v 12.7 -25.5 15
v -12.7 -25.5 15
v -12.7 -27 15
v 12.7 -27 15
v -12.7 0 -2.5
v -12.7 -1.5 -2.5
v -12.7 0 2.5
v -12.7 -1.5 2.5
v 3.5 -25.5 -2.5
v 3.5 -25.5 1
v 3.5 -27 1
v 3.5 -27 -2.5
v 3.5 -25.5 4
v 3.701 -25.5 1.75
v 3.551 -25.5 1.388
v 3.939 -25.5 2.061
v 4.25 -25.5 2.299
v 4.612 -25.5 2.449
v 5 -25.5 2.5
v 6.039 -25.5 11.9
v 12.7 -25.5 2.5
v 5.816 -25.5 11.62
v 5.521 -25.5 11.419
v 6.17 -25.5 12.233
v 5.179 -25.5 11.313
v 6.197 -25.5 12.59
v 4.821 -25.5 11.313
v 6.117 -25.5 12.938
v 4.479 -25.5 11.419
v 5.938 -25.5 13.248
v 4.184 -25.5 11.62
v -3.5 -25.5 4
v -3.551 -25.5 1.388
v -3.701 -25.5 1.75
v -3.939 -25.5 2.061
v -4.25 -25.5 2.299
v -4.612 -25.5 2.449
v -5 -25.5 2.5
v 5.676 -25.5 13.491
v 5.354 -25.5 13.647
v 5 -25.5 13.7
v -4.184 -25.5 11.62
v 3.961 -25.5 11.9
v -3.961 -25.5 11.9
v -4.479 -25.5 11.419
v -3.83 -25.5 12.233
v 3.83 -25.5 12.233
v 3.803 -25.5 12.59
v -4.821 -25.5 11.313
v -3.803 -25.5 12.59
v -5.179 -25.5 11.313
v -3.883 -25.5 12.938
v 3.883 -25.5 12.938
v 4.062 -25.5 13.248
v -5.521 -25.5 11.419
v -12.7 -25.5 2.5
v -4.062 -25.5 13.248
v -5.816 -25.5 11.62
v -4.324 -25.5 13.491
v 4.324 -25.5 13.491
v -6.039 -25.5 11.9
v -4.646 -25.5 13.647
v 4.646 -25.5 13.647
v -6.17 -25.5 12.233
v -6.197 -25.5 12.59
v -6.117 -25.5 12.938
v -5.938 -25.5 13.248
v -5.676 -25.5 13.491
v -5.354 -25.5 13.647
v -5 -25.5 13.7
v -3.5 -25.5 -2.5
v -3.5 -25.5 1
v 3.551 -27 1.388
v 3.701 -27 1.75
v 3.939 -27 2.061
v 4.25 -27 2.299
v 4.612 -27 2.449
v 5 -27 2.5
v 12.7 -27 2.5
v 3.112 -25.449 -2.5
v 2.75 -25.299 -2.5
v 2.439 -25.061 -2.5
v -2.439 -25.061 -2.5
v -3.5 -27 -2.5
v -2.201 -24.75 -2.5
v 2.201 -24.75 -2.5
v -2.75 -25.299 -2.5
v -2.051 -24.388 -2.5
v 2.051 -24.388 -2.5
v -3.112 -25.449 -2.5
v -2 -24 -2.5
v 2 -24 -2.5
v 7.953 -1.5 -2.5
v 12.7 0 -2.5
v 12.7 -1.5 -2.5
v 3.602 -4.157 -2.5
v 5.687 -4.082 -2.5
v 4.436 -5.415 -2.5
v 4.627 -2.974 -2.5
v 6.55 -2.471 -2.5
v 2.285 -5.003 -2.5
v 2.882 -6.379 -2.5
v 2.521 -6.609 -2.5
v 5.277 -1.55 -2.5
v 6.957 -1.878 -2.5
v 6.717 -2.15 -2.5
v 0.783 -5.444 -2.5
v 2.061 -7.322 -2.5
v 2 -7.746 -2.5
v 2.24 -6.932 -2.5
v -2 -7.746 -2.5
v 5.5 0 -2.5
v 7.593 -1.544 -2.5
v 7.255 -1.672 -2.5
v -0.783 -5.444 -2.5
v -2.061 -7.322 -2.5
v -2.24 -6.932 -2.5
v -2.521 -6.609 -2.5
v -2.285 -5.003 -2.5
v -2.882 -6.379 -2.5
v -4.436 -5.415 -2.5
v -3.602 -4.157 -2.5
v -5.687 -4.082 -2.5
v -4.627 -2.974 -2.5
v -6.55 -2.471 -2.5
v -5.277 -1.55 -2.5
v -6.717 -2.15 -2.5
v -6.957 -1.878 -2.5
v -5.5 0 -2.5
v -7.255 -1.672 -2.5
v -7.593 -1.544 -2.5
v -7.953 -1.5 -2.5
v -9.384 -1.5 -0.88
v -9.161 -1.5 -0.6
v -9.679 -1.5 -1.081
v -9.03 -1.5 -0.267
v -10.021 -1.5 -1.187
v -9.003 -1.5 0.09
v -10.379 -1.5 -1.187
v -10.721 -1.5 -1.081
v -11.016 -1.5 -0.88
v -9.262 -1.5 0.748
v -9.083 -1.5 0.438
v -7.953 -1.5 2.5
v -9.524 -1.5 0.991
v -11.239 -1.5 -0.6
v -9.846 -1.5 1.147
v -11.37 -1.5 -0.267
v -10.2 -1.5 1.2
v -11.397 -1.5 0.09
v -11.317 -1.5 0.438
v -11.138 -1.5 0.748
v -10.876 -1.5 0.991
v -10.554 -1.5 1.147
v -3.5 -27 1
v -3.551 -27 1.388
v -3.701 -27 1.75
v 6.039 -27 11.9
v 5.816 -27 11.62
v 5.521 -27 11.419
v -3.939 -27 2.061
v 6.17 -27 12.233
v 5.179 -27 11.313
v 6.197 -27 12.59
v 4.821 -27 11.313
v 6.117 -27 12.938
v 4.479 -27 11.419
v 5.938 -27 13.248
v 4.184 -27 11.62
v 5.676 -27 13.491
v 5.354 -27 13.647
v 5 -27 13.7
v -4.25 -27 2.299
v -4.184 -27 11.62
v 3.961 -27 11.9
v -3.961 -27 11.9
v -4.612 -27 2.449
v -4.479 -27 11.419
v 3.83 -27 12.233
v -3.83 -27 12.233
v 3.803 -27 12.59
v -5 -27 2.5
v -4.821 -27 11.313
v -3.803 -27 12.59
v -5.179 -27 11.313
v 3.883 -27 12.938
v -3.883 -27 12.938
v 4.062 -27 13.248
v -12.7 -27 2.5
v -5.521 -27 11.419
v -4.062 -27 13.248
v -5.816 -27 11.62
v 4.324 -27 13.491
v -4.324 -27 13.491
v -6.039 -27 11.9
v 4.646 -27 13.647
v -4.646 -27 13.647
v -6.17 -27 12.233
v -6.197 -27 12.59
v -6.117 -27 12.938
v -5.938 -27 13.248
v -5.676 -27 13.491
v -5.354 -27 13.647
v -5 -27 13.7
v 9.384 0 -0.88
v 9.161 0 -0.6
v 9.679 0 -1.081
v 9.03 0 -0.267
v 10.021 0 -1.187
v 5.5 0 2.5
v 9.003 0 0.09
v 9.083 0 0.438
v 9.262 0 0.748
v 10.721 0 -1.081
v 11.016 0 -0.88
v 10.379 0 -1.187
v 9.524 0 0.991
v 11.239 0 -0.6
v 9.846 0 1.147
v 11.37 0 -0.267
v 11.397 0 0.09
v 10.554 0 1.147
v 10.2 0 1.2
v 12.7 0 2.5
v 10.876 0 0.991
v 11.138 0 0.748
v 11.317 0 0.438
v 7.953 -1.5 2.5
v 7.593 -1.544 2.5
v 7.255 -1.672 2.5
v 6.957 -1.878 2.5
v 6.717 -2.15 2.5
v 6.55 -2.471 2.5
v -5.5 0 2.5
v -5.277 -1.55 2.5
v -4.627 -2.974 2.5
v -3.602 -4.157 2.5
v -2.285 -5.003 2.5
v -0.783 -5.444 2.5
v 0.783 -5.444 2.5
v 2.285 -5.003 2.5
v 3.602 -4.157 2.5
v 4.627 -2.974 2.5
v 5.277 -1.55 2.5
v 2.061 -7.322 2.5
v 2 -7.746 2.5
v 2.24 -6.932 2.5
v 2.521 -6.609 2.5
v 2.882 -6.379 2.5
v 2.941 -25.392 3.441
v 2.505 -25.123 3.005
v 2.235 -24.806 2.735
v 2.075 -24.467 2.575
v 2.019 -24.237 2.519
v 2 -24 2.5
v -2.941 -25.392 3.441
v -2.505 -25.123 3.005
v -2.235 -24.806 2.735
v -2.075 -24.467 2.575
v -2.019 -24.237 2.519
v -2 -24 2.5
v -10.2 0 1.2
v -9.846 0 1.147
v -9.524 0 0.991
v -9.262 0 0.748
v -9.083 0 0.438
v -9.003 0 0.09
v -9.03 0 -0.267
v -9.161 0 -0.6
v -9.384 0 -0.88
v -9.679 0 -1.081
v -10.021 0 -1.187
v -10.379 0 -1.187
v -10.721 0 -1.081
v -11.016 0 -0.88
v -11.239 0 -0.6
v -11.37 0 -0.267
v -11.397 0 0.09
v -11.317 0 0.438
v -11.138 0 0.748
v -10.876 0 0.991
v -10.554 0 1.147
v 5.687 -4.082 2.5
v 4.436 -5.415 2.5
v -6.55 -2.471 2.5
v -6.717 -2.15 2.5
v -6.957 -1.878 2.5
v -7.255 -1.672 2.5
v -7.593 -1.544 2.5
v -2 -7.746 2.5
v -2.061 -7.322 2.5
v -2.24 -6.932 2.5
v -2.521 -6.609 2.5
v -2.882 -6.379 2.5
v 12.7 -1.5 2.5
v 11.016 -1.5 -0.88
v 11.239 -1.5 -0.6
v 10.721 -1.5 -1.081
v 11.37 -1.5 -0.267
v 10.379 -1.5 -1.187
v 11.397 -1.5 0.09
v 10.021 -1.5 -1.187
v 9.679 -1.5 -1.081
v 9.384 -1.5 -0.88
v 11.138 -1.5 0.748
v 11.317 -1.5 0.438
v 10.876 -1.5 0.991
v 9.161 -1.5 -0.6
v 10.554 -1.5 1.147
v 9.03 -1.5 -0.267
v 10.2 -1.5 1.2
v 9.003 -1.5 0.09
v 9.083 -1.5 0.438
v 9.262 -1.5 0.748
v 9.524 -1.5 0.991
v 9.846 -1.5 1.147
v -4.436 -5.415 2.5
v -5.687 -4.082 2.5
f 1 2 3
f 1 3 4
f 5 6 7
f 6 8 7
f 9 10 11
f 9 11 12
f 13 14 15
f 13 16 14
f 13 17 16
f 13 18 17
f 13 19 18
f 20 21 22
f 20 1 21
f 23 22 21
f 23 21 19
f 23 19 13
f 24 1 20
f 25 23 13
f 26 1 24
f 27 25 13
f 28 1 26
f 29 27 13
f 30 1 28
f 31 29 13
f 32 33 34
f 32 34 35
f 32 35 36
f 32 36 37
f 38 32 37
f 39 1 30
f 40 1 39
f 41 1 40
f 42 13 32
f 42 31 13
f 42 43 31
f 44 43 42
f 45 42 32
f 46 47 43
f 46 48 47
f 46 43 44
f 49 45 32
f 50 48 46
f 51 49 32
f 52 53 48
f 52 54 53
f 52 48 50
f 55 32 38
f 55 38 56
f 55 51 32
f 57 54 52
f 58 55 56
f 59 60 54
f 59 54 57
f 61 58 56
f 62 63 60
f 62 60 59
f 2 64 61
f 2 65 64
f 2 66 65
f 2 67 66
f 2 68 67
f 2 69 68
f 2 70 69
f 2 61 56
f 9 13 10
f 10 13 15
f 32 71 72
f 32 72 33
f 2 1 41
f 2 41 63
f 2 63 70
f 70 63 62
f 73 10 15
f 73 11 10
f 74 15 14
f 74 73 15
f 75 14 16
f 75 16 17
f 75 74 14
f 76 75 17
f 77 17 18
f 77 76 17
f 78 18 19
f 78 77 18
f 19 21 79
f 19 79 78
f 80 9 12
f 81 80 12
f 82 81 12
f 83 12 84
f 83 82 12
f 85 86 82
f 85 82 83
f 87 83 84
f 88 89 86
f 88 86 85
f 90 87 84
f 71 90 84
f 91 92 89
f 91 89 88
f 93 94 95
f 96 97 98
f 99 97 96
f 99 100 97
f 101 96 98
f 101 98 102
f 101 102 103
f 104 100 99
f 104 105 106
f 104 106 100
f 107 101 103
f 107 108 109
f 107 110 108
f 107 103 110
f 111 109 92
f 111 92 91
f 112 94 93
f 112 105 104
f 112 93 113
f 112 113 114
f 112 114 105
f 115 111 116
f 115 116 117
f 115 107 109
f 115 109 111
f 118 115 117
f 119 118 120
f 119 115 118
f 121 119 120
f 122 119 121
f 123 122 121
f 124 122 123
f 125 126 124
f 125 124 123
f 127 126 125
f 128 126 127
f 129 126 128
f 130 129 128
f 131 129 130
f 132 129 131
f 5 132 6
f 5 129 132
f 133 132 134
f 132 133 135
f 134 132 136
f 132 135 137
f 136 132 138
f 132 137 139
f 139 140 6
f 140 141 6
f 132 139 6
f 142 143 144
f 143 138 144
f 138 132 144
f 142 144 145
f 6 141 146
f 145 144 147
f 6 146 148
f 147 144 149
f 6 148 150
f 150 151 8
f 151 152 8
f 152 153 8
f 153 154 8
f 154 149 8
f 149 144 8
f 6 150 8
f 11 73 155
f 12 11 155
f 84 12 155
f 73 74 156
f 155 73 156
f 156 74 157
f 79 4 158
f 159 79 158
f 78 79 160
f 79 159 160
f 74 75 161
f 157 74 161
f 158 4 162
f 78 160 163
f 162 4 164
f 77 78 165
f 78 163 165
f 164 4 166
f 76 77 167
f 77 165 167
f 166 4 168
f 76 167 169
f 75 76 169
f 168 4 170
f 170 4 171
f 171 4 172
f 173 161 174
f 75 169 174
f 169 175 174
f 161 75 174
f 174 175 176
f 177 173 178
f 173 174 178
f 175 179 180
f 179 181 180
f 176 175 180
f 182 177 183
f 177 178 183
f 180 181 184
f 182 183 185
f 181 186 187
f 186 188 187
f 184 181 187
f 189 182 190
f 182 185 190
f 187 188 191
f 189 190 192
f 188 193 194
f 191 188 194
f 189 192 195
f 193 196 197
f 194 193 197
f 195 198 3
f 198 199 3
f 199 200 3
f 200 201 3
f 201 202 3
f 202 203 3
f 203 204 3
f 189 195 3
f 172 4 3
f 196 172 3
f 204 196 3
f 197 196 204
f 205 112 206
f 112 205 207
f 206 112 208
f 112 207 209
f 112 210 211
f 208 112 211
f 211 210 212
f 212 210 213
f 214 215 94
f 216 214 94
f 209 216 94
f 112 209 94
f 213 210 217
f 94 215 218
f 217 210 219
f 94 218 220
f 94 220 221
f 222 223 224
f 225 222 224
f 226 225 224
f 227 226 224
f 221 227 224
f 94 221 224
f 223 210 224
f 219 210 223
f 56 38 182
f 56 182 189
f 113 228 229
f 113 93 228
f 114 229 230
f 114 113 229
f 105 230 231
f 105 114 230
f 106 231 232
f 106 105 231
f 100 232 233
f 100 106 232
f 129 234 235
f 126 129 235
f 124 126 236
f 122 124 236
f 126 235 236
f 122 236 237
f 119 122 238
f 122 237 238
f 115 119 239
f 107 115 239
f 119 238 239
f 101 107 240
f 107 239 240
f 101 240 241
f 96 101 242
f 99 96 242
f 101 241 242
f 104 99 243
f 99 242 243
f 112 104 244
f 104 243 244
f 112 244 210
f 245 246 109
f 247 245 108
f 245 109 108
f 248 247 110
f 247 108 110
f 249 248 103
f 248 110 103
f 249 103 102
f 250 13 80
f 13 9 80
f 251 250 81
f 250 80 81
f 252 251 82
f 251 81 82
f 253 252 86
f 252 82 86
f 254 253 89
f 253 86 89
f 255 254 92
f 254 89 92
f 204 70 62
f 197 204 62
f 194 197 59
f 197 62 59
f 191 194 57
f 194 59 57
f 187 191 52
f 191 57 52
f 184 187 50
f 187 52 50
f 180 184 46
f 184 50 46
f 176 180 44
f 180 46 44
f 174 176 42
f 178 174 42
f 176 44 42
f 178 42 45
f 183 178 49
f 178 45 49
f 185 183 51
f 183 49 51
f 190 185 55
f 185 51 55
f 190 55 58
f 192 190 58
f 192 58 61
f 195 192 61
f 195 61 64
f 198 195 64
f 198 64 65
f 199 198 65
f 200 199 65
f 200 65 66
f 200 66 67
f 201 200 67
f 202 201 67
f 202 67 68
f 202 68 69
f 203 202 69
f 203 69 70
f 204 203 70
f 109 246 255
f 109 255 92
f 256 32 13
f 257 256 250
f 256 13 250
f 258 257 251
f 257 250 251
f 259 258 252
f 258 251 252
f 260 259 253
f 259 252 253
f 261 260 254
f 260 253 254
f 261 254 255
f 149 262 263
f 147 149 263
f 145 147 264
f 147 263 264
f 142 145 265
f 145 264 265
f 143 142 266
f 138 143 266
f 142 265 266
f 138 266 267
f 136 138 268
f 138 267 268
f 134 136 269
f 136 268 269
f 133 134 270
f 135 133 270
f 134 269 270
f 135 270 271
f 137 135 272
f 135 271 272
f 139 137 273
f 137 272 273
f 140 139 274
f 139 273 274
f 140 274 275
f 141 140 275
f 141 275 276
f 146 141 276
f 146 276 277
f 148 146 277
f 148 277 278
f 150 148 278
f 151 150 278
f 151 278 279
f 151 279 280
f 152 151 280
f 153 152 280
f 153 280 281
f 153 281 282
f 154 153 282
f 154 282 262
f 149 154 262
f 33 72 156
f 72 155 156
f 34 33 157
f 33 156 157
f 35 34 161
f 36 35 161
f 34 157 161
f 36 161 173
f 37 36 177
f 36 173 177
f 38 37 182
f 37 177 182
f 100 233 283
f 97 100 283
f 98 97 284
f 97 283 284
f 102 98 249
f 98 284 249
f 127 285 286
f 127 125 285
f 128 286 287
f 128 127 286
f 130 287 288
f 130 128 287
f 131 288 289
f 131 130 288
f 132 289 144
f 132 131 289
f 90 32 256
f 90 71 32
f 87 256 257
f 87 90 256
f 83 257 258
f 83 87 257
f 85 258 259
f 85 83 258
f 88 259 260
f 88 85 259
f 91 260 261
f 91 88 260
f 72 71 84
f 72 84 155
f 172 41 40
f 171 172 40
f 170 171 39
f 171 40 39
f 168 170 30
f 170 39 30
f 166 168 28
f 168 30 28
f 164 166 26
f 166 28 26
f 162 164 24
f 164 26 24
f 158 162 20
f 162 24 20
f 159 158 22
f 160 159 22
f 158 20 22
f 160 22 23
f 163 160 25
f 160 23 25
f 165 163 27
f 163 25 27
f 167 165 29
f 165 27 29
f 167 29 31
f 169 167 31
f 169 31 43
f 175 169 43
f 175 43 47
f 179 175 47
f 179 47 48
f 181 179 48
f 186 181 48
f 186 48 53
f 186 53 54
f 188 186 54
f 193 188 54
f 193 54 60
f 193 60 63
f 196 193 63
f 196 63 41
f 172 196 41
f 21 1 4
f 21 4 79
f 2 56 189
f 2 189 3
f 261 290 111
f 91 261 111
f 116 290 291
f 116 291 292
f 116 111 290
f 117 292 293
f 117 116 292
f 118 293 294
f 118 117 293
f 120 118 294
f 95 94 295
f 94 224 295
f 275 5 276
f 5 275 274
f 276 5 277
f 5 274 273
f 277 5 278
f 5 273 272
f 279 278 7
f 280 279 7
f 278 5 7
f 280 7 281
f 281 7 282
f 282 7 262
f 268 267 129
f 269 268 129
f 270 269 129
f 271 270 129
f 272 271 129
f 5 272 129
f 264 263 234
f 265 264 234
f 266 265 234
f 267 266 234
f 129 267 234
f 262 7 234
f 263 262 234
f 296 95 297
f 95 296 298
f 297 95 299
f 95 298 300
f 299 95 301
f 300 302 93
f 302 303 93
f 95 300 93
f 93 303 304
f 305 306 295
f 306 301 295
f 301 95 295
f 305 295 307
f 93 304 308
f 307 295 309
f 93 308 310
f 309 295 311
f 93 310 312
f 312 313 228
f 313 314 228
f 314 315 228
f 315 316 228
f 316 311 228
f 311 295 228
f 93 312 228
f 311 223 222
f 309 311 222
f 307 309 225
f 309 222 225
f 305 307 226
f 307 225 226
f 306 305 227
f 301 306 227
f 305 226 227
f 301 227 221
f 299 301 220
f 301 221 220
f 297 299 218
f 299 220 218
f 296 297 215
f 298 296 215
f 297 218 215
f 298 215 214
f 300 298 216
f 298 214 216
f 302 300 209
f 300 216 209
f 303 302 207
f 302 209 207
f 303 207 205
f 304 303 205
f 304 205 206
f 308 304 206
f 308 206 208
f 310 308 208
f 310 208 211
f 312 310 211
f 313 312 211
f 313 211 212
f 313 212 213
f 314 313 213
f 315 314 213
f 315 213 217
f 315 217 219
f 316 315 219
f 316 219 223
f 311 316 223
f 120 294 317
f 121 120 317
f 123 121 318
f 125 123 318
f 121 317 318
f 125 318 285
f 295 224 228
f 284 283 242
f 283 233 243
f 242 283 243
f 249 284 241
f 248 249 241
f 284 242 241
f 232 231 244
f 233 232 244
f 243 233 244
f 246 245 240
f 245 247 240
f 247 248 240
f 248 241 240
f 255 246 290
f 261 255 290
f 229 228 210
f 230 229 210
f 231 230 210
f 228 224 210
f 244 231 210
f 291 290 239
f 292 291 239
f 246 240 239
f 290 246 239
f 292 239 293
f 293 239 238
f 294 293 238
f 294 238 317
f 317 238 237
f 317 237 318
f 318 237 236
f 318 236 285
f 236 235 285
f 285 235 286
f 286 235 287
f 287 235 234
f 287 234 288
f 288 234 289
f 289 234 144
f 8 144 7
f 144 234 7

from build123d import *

# Parameters (mm, degrees)
BOSS_EXTRUDE1_DEPTH      = 2.5
SKETCH2_R                = 1.2
CUT_EXTRUDE1_DEPTH       = 15.715298162
BOSS_EXTRUDE2_REACH      = 42.215
BOSS_EXTRUDE2_END_RADIUS = 7
BOSS_EXTRUDE2_START      = -25.5
SKETCH6_W                = 4
SKETCH6_H                = 5
BOSS_EXTRUDE4_DEPTH      = 1.5
FILLET1_R                = 1.5
SKETCH8_R                = 1.2
CUT_EXTRUDE3_DEPTH       = 34.395957839


with BuildPart() as part:
    # Sketch1 → Boss-Extrude1 (new, symmetric)
    with BuildSketch(Plane.XY):
        with BuildLine():
            Line((5.5, 0), (12.7, 0))
            Line((12.7, 0), (12.7, -1.5))
            Line((12.7, -1.5), (6.837397166, -1.5))
            ThreePointArc((6.837397166, -1.5), (0, -7), (-6.837397166, -1.5))
            Line((-6.837397166, -1.5), (-12.7, -1.5))
            Line((-12.7, -1.5), (-12.7, 0))
            Line((-12.7, 0), (-5.5, 0))
            ThreePointArc((-5.5, 0), (0, -5.5), (5.5, 0))
        make_face()
    extrude(amount=BOSS_EXTRUDE1_DEPTH, both=True)

    # Sketch2 → Cut-Extrude1 (cut, through all)
    with BuildSketch(Plane(origin=(0, 0, 0), x_dir=(1, 0, 0), z_dir=(0, 1, 0))):
        with Locations(Location((-10.2, 0, 0), (0, 0, 270))):
            Circle(SKETCH2_R)
        with Locations(Location((10.2, 0, 0), (0, 0, 270))):
            Circle(SKETCH2_R)
    extrude(amount=-CUT_EXTRUDE1_DEPTH, mode=Mode.SUBTRACT)

    # Boss-Extrude2: up to this cylinder (the profile starts outside it)
    boss_extrude2_end = Plane(origin=(0, 0, 0), z_dir=(0, 0, -1)) * Cylinder(BOSS_EXTRUDE2_END_RADIUS, 99.43, mode=Mode.PRIVATE)
    # Sketch6 → Boss-Extrude2 (add, up to the surface)
    with BuildSketch(Plane(origin=(0, 0, 0), x_dir=(1, 0, 0), z_dir=(0, 1, 0)).offset(BOSS_EXTRUDE2_START), mode=Mode.PRIVATE) as boss_extrude2_sk1:
        Rectangle(SKETCH6_W, SKETCH6_H)
    boss_extrude2_tool1 = extrude(boss_extrude2_sk1.sketch, amount=BOSS_EXTRUDE2_REACH, mode=Mode.PRIVATE) - boss_extrude2_end
    add(boss_extrude2_tool1.solids().sort_by_distance((0, -25.5, 0))[0])

    # Sketch7 → Boss-Extrude4 (add)
    with BuildSketch(Plane.XZ.offset(25.5)):
        Polygon((3.5, -2.5), (-3.5, -2.5), (-3.5, 2.5), (-12.7, 2.5), (-12.7, 15), (12.7, 15), (12.7, 2.5), (3.5, 2.5), align=None)
    extrude(amount=BOSS_EXTRUDE4_DEPTH)

    # Fillet1
    fillet1_edges = [part.edges().sort_by_distance(p)[0] for p in [
        (2, -25.5, 0),
        (-2, -25.5, 0),
        (-6.837397166, -1.5, 0),
        (-2, -6.708203932, 0),
        (2, -6.708203932, 0),
        (6.837397166, -1.5, 0),
        (3.5, -26.25, 2.5),
        (-3.5, -26.25, 2.5),
        (0, -25.5, 2.5),
    ]]
    fillet(fillet1_edges, radius=FILLET1_R - 0.0001)  # a hair under: the kernel refuses the full size

    # Sketch8 → Cut-Extrude3 (cut, through all)
    with BuildSketch(Plane(origin=(0, 0, 0), x_dir=(1, 0, 0), z_dir=(0, 1, 0))):
        with Locations(Location((-5, -12.5, 0), (0, 0, 270))):
            Circle(SKETCH8_R)
        with Locations(Location((5, -12.5, 0), (0, 0, 270))):
            Circle(SKETCH8_R)
    extrude(amount=-CUT_EXTRUDE3_DEPTH, mode=Mode.SUBTRACT)


solid = part.part
